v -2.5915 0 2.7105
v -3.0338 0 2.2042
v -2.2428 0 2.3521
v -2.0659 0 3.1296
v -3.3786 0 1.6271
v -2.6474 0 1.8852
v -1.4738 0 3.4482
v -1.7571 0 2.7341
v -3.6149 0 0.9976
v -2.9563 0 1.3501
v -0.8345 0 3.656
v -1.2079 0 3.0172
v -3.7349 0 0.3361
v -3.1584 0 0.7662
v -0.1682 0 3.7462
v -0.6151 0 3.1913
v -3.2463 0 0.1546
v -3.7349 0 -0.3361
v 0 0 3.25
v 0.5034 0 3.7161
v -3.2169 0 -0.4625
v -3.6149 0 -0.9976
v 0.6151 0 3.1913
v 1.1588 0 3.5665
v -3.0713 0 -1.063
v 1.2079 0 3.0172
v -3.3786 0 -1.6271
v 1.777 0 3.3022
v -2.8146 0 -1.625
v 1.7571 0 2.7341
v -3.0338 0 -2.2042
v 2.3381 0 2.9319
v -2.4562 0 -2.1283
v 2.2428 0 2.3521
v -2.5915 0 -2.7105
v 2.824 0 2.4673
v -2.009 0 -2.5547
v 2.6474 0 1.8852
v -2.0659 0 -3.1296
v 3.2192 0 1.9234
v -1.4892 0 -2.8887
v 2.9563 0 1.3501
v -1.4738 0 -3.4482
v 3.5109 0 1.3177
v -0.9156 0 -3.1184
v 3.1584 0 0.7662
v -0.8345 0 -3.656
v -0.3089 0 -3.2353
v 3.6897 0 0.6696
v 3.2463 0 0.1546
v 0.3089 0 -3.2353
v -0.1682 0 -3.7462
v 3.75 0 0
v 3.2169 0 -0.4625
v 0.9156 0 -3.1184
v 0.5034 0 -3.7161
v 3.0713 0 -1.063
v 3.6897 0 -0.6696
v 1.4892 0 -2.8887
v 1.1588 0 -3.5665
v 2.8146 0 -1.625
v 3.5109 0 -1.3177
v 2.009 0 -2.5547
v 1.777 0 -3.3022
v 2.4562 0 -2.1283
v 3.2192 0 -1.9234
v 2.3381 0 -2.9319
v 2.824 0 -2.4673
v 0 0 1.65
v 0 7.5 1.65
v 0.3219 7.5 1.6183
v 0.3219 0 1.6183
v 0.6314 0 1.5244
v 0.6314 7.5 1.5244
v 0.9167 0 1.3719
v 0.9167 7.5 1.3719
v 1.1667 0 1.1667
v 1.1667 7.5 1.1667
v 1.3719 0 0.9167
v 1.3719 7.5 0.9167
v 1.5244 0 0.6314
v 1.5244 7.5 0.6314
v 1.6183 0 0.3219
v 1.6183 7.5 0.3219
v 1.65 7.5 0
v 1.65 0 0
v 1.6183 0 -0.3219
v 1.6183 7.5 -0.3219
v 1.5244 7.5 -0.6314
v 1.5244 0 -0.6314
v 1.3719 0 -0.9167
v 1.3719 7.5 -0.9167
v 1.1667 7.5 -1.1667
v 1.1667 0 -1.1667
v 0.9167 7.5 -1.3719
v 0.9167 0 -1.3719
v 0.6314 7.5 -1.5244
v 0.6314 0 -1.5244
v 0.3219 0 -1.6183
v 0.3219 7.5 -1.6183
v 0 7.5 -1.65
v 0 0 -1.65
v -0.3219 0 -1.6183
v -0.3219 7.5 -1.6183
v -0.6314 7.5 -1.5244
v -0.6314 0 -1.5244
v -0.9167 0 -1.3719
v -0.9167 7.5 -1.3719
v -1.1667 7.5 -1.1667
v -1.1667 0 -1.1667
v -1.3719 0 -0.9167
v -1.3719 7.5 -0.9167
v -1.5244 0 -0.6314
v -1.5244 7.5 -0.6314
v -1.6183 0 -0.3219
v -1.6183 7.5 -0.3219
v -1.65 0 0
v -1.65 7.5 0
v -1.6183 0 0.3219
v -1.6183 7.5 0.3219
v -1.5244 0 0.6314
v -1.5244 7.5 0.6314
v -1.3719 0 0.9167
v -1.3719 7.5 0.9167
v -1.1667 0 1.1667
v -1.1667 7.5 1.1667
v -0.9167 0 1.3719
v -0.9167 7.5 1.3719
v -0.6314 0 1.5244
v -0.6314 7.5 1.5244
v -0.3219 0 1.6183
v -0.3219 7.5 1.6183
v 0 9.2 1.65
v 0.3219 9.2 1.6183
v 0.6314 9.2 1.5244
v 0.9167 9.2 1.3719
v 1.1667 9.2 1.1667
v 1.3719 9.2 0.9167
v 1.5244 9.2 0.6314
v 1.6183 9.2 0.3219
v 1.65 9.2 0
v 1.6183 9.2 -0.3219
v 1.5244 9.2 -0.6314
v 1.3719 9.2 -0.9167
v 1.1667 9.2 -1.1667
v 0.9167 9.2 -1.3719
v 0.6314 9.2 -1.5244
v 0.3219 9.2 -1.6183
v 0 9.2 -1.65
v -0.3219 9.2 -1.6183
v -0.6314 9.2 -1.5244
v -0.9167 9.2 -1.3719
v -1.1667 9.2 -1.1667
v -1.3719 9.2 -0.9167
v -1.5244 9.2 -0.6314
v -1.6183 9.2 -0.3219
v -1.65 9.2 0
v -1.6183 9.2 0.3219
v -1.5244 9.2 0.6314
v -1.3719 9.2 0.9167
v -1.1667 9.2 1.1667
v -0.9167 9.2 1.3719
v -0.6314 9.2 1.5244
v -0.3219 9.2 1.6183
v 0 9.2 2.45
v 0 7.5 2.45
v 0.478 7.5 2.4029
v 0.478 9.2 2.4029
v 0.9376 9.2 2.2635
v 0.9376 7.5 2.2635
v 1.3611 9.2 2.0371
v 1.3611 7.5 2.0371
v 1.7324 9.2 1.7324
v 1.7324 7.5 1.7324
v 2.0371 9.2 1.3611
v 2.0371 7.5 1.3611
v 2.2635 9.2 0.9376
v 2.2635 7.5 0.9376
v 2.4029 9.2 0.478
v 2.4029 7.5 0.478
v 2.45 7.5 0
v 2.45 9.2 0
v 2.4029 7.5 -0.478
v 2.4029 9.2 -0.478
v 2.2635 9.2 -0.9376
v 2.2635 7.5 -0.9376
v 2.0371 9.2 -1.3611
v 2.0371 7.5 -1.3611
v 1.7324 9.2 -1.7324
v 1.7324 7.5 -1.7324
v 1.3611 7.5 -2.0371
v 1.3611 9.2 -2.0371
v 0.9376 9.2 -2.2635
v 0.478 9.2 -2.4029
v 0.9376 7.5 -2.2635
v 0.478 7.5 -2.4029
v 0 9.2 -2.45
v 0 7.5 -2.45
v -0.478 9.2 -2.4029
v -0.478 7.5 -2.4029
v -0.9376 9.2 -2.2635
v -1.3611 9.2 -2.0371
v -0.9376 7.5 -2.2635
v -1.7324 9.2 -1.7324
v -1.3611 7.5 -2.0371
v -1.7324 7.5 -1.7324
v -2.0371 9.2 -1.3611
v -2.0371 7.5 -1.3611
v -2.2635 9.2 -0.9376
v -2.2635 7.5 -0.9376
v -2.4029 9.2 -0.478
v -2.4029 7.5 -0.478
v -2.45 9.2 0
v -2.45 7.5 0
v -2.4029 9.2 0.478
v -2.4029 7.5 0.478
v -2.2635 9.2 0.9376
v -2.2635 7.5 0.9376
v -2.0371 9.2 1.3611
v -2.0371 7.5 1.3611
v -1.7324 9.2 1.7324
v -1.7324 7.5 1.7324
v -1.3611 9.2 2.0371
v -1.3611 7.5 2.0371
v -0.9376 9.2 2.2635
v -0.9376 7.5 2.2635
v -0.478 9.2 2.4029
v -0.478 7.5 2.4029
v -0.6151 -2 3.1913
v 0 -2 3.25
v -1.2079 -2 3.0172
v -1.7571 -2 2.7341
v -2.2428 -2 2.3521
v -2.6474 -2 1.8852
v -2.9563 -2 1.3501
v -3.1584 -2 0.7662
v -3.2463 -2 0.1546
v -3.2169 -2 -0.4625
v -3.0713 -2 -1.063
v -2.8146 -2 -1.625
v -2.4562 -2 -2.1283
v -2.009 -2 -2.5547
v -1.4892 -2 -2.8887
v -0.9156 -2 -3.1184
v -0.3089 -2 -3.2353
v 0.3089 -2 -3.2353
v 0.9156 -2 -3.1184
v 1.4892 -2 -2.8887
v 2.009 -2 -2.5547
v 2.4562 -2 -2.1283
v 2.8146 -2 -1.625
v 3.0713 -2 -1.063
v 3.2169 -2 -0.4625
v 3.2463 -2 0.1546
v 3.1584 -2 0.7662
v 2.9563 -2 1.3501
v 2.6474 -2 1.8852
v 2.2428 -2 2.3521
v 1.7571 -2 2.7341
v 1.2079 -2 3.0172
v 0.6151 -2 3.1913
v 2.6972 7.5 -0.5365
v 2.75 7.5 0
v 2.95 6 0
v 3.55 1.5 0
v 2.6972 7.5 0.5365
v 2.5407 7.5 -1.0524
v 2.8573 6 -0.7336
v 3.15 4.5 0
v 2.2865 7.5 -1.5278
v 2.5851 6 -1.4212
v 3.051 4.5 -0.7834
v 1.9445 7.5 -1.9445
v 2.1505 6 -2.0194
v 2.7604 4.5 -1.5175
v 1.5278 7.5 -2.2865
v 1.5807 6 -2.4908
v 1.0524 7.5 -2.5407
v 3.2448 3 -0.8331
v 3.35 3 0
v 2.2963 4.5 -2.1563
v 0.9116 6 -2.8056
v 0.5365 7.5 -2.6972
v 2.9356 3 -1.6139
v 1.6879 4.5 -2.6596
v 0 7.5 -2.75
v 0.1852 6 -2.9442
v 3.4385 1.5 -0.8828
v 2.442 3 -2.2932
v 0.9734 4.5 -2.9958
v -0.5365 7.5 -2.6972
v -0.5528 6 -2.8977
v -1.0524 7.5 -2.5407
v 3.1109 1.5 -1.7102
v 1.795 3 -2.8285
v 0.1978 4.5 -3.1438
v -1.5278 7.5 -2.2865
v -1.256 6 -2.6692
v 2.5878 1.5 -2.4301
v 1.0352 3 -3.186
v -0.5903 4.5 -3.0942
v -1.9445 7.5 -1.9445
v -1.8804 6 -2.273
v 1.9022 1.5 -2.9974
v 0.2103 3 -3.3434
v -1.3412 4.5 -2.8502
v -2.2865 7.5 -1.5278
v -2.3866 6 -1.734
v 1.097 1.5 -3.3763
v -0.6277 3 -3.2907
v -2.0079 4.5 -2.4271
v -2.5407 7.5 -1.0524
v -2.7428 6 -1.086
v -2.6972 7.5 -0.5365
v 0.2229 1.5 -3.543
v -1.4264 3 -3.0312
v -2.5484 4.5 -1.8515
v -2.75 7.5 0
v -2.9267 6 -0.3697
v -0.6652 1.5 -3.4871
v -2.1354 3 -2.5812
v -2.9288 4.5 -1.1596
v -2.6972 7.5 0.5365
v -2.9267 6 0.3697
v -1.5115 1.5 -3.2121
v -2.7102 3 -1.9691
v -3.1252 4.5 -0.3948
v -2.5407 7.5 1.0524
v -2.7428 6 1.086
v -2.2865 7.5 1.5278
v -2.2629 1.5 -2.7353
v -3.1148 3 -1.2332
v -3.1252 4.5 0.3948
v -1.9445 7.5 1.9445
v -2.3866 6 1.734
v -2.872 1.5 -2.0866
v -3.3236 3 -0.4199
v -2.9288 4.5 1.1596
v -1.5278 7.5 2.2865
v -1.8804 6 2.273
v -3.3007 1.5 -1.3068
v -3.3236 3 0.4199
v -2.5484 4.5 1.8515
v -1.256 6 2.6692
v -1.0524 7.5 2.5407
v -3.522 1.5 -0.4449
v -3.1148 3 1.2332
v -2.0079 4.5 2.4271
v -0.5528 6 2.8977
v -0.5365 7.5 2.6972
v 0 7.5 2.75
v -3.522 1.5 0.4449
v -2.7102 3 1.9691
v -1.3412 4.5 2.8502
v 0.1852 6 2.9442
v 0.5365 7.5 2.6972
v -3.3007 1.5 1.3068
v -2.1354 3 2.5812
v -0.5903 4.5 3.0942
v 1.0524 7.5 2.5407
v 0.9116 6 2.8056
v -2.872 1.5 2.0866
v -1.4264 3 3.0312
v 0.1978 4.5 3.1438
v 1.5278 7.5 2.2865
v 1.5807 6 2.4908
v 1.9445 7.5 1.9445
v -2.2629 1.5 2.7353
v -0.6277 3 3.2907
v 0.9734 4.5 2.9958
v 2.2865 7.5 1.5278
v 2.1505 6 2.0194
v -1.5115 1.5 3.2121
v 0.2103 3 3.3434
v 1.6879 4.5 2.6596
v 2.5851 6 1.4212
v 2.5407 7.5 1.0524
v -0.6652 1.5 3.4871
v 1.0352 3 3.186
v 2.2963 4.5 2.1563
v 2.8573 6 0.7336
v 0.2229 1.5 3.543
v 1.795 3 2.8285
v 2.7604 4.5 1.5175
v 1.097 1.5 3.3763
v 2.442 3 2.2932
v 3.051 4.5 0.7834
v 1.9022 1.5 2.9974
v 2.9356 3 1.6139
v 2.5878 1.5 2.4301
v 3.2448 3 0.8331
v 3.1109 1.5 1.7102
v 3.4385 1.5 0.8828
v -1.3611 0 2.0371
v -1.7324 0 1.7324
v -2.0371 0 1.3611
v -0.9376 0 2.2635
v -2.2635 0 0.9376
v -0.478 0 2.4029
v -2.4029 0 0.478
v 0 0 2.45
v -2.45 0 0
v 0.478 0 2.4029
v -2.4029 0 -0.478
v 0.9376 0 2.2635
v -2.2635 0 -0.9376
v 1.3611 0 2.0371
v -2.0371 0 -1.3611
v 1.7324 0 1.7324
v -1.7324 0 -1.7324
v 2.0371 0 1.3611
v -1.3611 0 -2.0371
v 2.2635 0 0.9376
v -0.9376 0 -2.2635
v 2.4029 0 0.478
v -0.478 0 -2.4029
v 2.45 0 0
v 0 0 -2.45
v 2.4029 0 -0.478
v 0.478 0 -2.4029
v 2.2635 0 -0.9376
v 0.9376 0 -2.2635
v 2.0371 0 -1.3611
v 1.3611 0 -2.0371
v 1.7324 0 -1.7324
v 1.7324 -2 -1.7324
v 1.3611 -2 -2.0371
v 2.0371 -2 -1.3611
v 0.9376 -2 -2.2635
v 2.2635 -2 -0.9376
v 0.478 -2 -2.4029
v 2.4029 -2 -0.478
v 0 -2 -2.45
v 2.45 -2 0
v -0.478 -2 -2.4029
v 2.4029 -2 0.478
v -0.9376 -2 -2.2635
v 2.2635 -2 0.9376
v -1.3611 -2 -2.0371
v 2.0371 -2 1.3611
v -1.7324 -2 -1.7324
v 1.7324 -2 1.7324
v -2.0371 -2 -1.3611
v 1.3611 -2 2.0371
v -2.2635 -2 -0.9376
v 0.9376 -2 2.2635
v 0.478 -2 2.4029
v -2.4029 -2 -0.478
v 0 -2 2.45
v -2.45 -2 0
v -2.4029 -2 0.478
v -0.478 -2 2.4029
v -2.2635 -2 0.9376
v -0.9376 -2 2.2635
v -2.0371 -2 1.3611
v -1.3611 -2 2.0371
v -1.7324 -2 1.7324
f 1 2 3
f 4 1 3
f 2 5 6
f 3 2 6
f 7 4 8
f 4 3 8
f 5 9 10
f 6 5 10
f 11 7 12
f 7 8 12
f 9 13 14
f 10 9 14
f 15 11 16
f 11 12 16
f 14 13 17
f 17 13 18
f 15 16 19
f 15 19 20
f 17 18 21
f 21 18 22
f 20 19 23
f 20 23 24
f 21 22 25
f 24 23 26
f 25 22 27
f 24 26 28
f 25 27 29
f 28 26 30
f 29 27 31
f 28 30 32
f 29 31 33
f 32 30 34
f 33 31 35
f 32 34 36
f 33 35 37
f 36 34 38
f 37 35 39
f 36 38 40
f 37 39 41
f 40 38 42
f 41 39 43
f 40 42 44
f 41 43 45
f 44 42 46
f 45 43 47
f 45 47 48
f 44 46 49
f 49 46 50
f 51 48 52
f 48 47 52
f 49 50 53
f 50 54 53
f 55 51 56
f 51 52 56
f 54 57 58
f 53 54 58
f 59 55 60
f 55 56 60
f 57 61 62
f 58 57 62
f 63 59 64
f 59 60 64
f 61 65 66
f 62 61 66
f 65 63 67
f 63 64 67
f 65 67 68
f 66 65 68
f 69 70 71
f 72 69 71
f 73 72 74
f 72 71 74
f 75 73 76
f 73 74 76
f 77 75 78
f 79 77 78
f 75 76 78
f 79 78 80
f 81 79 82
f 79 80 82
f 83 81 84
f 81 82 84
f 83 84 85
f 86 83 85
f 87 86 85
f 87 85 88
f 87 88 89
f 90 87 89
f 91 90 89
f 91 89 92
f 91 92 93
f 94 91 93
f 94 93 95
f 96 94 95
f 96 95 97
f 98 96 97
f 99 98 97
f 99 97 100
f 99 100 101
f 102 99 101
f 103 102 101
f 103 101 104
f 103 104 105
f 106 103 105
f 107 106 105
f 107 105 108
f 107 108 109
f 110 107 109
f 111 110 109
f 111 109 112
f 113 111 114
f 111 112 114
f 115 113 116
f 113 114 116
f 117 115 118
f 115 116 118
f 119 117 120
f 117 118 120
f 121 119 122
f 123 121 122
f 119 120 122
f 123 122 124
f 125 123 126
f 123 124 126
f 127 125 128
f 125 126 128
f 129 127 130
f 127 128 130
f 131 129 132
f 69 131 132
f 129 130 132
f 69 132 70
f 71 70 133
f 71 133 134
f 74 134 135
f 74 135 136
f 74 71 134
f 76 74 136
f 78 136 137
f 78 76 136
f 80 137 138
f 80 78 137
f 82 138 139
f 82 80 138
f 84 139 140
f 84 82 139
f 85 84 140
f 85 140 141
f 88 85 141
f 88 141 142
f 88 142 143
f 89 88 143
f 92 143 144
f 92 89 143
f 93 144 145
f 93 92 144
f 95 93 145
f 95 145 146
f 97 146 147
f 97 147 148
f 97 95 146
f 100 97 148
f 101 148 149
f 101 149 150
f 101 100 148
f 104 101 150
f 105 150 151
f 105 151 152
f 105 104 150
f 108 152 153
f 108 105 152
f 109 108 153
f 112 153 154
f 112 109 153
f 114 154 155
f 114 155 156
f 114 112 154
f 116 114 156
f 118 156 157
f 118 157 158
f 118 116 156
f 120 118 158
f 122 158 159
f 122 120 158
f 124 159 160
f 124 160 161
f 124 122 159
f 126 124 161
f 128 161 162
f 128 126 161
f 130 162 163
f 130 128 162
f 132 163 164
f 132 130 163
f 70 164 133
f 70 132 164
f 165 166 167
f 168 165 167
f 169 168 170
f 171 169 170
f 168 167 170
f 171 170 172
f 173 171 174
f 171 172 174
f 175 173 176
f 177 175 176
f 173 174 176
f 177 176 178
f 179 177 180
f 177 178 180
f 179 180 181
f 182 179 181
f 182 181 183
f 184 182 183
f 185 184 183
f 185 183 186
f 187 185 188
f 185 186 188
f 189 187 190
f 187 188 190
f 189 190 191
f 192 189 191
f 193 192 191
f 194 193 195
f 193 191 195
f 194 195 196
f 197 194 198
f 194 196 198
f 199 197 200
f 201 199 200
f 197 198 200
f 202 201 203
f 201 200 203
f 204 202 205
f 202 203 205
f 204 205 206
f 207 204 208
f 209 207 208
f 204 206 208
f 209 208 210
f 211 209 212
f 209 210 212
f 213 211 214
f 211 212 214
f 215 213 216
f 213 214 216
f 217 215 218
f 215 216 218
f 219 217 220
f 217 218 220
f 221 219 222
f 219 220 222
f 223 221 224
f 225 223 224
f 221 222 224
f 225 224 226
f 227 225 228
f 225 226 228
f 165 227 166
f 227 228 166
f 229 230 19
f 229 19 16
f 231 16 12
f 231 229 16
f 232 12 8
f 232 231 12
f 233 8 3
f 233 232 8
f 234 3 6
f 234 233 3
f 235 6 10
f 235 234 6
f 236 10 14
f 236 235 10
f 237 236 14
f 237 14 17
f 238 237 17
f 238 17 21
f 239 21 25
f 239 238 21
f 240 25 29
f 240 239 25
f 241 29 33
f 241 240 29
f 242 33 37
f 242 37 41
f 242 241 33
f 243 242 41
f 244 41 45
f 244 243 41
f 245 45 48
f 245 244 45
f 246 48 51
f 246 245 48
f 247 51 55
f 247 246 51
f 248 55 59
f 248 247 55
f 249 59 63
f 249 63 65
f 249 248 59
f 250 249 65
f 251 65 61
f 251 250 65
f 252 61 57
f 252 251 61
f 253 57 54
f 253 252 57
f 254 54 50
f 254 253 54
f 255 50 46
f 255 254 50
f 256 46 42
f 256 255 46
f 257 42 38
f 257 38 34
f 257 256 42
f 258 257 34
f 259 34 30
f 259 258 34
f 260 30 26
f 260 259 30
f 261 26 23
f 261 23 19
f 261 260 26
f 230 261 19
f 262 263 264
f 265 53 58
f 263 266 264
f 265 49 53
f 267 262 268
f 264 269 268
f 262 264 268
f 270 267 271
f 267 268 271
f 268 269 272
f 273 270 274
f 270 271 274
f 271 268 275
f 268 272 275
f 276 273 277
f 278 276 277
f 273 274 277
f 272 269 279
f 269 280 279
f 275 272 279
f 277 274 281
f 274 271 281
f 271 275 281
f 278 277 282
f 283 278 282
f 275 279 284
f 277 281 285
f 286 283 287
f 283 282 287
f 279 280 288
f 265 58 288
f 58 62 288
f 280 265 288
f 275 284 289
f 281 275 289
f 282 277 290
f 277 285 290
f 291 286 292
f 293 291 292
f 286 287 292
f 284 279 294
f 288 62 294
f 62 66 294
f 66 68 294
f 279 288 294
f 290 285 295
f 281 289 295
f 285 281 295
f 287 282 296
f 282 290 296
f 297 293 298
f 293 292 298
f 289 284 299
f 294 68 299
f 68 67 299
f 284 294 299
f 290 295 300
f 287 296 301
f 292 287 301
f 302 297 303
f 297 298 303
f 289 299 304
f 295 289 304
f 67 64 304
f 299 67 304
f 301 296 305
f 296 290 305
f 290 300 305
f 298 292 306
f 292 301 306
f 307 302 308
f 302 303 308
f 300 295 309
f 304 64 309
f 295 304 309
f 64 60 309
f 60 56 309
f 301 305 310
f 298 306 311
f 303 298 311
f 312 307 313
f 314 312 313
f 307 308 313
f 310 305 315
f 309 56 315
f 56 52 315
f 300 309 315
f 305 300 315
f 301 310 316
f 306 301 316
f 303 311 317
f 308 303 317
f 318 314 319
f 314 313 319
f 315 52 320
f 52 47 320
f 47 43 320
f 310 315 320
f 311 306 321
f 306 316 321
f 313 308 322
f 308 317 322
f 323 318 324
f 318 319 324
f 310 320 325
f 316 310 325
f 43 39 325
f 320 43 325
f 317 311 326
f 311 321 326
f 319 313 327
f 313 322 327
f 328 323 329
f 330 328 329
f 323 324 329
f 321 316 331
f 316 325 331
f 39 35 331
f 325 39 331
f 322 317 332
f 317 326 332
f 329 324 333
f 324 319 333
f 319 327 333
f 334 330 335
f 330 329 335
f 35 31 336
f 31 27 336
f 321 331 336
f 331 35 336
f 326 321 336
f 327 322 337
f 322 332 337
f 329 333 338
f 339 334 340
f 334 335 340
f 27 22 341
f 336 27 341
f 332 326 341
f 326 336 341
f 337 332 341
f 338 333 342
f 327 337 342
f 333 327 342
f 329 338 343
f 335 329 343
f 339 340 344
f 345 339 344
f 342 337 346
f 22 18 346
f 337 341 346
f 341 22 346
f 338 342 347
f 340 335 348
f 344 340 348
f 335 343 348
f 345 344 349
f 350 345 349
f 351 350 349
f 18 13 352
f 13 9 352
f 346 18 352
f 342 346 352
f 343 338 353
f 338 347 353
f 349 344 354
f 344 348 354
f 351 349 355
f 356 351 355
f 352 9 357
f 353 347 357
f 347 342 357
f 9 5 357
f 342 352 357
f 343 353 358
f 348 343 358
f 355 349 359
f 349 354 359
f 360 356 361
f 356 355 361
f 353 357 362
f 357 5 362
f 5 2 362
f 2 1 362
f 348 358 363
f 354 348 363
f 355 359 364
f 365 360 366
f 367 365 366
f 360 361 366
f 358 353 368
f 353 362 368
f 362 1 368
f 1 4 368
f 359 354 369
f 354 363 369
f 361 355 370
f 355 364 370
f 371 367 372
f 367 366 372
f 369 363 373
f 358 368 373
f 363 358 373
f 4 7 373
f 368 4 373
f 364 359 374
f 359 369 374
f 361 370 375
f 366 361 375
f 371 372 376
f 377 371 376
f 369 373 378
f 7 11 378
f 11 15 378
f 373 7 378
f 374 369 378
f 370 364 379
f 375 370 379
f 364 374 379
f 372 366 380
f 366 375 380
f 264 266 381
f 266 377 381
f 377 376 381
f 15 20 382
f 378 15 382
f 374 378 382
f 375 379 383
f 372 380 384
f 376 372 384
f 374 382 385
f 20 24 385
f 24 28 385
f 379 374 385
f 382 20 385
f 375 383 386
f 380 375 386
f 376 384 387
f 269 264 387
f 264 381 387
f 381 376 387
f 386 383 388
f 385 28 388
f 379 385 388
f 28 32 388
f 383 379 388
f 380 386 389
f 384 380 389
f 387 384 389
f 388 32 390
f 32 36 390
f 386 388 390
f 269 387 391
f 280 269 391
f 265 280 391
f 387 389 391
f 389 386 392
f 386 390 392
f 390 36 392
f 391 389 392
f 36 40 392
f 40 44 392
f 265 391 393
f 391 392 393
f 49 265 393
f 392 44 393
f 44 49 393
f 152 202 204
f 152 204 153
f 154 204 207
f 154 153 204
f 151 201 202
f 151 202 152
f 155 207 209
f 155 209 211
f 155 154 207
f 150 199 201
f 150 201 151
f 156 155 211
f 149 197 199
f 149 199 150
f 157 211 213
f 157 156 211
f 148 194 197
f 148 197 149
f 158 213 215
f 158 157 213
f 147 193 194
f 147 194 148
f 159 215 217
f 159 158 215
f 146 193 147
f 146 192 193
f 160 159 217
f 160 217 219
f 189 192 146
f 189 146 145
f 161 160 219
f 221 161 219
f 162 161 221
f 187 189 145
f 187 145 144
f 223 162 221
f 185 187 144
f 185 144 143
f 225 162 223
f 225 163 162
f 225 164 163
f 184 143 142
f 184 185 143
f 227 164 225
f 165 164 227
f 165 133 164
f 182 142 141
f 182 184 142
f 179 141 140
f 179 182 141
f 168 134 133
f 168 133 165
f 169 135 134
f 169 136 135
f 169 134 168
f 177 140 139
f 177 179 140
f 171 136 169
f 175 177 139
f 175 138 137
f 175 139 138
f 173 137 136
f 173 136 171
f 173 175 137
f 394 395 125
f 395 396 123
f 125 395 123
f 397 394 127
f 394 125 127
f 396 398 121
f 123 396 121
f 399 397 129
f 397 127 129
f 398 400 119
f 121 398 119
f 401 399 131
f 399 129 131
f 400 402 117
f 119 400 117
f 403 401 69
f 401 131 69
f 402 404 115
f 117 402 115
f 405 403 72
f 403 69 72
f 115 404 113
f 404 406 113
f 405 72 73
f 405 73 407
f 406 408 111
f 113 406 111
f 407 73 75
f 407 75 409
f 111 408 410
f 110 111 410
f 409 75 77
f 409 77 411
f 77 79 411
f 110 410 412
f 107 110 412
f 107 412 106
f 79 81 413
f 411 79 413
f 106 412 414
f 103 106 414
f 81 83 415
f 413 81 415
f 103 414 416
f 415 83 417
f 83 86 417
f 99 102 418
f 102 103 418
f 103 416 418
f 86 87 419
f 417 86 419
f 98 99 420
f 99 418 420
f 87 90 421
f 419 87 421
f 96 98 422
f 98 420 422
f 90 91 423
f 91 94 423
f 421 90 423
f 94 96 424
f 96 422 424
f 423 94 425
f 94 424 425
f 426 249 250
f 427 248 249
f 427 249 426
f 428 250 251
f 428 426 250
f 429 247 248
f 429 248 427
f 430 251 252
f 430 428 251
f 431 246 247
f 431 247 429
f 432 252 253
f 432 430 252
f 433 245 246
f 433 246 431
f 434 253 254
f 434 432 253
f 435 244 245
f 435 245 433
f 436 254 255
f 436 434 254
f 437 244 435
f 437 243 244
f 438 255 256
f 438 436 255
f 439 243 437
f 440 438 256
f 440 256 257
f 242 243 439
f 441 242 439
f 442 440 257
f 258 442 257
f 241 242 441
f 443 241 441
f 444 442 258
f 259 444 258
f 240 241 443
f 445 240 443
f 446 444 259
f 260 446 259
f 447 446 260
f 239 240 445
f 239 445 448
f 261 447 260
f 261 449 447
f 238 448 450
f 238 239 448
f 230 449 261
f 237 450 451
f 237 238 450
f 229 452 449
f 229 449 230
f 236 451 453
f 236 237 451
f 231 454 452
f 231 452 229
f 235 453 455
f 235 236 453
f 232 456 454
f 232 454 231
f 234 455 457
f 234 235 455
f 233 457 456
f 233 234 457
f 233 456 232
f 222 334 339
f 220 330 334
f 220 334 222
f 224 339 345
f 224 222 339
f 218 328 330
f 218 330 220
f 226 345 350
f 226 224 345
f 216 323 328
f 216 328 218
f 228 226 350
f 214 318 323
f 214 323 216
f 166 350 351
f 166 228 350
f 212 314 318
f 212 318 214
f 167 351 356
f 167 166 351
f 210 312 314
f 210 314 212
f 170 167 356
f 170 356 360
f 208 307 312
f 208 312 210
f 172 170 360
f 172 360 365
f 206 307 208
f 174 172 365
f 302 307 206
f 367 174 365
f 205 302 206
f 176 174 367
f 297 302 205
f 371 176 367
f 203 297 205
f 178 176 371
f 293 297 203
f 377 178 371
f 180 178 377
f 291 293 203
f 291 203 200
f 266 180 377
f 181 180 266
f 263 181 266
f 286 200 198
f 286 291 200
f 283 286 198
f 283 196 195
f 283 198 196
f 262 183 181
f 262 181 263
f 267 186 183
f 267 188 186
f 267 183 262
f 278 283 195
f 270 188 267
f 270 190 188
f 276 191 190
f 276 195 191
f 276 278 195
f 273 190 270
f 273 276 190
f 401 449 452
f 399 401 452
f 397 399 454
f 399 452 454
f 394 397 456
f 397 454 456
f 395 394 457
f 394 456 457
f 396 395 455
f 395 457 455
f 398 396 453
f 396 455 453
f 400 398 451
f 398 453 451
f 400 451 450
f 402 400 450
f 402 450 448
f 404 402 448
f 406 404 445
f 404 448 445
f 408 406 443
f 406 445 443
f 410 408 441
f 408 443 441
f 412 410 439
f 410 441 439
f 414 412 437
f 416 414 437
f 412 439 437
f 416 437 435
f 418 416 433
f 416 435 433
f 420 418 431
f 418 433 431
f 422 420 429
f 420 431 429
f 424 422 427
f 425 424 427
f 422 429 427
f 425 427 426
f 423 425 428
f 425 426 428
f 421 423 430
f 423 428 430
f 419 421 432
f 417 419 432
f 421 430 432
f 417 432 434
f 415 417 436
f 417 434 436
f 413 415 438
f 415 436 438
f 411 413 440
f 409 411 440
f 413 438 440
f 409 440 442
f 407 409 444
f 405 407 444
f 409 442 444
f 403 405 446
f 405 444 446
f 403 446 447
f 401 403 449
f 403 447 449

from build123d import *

# Parameters (mm, degrees)
SKETCH2_R           = 2.75
SKETCH1_R           = 3.75
SKETCH3_R           = 2.45
SKETCH3_R_2         = 1.65
BOSS_EXTRUDE1_DEPTH = 1.7
BOSS_EXTRUDE2_START = 2
SKETCH4_R           = 3.25
SKETCH4_R_2         = 2.45
BOSS_EXTRUDE2_DEPTH = 2
SKETCH5_R           = 1.65
CUT_EXTRUDE1_DEPTH  = 11.880027642


with BuildPart() as part:
    # Sketch2 → Loft1 section 0
    with BuildSketch(Plane(origin=(0, 7.5, 0), x_dir=(1, 0, 0), z_dir=(0, 1, 0))):
        Circle(SKETCH2_R)
    # Sketch1 → Loft1 section 1
    with BuildSketch(Plane(origin=(0, 0, 0), x_dir=(1, 0, 0), z_dir=(0, 1, 0))):
        Circle(SKETCH1_R)
    loft()

    # Sketch3 → Boss-Extrude1 (add)
    with BuildSketch(Plane(origin=(0, 7.5, 0), x_dir=(1, 0, 0), z_dir=(0, 1, 0))):
        with Locations(Location((0, 0, 0), (0, 0, 270))):
            Circle(SKETCH3_R)
        with Locations(Location((0, 0, 0), (0, 0, 270))):
            Circle(SKETCH3_R_2, mode=Mode.SUBTRACT)
    extrude(amount=BOSS_EXTRUDE1_DEPTH)

    # Sketch4 → Boss-Extrude2 (add)
    with BuildSketch(Plane.XZ.offset(BOSS_EXTRUDE2_START)):
        with Locations(Location((0, 0, 0), (0, 0, 90))):
            Circle(SKETCH4_R)
        with Locations(Location((0, 0, 0), (0, 0, 90))):
            Circle(SKETCH4_R_2, mode=Mode.SUBTRACT)
    extrude(amount=-BOSS_EXTRUDE2_DEPTH)

    # Sketch5 → Cut-Extrude1 (cut, through all)
    with BuildSketch(Plane(origin=(0, 7.5, 0), x_dir=(1, 0, 0), z_dir=(0, 1, 0))):
        with Locations(Location((0, 0, 0), (0, 0, 270))):
            Circle(SKETCH5_R)
    extrude(amount=-CUT_EXTRUDE1_DEPTH, mode=Mode.SUBTRACT)


solid = part.part
